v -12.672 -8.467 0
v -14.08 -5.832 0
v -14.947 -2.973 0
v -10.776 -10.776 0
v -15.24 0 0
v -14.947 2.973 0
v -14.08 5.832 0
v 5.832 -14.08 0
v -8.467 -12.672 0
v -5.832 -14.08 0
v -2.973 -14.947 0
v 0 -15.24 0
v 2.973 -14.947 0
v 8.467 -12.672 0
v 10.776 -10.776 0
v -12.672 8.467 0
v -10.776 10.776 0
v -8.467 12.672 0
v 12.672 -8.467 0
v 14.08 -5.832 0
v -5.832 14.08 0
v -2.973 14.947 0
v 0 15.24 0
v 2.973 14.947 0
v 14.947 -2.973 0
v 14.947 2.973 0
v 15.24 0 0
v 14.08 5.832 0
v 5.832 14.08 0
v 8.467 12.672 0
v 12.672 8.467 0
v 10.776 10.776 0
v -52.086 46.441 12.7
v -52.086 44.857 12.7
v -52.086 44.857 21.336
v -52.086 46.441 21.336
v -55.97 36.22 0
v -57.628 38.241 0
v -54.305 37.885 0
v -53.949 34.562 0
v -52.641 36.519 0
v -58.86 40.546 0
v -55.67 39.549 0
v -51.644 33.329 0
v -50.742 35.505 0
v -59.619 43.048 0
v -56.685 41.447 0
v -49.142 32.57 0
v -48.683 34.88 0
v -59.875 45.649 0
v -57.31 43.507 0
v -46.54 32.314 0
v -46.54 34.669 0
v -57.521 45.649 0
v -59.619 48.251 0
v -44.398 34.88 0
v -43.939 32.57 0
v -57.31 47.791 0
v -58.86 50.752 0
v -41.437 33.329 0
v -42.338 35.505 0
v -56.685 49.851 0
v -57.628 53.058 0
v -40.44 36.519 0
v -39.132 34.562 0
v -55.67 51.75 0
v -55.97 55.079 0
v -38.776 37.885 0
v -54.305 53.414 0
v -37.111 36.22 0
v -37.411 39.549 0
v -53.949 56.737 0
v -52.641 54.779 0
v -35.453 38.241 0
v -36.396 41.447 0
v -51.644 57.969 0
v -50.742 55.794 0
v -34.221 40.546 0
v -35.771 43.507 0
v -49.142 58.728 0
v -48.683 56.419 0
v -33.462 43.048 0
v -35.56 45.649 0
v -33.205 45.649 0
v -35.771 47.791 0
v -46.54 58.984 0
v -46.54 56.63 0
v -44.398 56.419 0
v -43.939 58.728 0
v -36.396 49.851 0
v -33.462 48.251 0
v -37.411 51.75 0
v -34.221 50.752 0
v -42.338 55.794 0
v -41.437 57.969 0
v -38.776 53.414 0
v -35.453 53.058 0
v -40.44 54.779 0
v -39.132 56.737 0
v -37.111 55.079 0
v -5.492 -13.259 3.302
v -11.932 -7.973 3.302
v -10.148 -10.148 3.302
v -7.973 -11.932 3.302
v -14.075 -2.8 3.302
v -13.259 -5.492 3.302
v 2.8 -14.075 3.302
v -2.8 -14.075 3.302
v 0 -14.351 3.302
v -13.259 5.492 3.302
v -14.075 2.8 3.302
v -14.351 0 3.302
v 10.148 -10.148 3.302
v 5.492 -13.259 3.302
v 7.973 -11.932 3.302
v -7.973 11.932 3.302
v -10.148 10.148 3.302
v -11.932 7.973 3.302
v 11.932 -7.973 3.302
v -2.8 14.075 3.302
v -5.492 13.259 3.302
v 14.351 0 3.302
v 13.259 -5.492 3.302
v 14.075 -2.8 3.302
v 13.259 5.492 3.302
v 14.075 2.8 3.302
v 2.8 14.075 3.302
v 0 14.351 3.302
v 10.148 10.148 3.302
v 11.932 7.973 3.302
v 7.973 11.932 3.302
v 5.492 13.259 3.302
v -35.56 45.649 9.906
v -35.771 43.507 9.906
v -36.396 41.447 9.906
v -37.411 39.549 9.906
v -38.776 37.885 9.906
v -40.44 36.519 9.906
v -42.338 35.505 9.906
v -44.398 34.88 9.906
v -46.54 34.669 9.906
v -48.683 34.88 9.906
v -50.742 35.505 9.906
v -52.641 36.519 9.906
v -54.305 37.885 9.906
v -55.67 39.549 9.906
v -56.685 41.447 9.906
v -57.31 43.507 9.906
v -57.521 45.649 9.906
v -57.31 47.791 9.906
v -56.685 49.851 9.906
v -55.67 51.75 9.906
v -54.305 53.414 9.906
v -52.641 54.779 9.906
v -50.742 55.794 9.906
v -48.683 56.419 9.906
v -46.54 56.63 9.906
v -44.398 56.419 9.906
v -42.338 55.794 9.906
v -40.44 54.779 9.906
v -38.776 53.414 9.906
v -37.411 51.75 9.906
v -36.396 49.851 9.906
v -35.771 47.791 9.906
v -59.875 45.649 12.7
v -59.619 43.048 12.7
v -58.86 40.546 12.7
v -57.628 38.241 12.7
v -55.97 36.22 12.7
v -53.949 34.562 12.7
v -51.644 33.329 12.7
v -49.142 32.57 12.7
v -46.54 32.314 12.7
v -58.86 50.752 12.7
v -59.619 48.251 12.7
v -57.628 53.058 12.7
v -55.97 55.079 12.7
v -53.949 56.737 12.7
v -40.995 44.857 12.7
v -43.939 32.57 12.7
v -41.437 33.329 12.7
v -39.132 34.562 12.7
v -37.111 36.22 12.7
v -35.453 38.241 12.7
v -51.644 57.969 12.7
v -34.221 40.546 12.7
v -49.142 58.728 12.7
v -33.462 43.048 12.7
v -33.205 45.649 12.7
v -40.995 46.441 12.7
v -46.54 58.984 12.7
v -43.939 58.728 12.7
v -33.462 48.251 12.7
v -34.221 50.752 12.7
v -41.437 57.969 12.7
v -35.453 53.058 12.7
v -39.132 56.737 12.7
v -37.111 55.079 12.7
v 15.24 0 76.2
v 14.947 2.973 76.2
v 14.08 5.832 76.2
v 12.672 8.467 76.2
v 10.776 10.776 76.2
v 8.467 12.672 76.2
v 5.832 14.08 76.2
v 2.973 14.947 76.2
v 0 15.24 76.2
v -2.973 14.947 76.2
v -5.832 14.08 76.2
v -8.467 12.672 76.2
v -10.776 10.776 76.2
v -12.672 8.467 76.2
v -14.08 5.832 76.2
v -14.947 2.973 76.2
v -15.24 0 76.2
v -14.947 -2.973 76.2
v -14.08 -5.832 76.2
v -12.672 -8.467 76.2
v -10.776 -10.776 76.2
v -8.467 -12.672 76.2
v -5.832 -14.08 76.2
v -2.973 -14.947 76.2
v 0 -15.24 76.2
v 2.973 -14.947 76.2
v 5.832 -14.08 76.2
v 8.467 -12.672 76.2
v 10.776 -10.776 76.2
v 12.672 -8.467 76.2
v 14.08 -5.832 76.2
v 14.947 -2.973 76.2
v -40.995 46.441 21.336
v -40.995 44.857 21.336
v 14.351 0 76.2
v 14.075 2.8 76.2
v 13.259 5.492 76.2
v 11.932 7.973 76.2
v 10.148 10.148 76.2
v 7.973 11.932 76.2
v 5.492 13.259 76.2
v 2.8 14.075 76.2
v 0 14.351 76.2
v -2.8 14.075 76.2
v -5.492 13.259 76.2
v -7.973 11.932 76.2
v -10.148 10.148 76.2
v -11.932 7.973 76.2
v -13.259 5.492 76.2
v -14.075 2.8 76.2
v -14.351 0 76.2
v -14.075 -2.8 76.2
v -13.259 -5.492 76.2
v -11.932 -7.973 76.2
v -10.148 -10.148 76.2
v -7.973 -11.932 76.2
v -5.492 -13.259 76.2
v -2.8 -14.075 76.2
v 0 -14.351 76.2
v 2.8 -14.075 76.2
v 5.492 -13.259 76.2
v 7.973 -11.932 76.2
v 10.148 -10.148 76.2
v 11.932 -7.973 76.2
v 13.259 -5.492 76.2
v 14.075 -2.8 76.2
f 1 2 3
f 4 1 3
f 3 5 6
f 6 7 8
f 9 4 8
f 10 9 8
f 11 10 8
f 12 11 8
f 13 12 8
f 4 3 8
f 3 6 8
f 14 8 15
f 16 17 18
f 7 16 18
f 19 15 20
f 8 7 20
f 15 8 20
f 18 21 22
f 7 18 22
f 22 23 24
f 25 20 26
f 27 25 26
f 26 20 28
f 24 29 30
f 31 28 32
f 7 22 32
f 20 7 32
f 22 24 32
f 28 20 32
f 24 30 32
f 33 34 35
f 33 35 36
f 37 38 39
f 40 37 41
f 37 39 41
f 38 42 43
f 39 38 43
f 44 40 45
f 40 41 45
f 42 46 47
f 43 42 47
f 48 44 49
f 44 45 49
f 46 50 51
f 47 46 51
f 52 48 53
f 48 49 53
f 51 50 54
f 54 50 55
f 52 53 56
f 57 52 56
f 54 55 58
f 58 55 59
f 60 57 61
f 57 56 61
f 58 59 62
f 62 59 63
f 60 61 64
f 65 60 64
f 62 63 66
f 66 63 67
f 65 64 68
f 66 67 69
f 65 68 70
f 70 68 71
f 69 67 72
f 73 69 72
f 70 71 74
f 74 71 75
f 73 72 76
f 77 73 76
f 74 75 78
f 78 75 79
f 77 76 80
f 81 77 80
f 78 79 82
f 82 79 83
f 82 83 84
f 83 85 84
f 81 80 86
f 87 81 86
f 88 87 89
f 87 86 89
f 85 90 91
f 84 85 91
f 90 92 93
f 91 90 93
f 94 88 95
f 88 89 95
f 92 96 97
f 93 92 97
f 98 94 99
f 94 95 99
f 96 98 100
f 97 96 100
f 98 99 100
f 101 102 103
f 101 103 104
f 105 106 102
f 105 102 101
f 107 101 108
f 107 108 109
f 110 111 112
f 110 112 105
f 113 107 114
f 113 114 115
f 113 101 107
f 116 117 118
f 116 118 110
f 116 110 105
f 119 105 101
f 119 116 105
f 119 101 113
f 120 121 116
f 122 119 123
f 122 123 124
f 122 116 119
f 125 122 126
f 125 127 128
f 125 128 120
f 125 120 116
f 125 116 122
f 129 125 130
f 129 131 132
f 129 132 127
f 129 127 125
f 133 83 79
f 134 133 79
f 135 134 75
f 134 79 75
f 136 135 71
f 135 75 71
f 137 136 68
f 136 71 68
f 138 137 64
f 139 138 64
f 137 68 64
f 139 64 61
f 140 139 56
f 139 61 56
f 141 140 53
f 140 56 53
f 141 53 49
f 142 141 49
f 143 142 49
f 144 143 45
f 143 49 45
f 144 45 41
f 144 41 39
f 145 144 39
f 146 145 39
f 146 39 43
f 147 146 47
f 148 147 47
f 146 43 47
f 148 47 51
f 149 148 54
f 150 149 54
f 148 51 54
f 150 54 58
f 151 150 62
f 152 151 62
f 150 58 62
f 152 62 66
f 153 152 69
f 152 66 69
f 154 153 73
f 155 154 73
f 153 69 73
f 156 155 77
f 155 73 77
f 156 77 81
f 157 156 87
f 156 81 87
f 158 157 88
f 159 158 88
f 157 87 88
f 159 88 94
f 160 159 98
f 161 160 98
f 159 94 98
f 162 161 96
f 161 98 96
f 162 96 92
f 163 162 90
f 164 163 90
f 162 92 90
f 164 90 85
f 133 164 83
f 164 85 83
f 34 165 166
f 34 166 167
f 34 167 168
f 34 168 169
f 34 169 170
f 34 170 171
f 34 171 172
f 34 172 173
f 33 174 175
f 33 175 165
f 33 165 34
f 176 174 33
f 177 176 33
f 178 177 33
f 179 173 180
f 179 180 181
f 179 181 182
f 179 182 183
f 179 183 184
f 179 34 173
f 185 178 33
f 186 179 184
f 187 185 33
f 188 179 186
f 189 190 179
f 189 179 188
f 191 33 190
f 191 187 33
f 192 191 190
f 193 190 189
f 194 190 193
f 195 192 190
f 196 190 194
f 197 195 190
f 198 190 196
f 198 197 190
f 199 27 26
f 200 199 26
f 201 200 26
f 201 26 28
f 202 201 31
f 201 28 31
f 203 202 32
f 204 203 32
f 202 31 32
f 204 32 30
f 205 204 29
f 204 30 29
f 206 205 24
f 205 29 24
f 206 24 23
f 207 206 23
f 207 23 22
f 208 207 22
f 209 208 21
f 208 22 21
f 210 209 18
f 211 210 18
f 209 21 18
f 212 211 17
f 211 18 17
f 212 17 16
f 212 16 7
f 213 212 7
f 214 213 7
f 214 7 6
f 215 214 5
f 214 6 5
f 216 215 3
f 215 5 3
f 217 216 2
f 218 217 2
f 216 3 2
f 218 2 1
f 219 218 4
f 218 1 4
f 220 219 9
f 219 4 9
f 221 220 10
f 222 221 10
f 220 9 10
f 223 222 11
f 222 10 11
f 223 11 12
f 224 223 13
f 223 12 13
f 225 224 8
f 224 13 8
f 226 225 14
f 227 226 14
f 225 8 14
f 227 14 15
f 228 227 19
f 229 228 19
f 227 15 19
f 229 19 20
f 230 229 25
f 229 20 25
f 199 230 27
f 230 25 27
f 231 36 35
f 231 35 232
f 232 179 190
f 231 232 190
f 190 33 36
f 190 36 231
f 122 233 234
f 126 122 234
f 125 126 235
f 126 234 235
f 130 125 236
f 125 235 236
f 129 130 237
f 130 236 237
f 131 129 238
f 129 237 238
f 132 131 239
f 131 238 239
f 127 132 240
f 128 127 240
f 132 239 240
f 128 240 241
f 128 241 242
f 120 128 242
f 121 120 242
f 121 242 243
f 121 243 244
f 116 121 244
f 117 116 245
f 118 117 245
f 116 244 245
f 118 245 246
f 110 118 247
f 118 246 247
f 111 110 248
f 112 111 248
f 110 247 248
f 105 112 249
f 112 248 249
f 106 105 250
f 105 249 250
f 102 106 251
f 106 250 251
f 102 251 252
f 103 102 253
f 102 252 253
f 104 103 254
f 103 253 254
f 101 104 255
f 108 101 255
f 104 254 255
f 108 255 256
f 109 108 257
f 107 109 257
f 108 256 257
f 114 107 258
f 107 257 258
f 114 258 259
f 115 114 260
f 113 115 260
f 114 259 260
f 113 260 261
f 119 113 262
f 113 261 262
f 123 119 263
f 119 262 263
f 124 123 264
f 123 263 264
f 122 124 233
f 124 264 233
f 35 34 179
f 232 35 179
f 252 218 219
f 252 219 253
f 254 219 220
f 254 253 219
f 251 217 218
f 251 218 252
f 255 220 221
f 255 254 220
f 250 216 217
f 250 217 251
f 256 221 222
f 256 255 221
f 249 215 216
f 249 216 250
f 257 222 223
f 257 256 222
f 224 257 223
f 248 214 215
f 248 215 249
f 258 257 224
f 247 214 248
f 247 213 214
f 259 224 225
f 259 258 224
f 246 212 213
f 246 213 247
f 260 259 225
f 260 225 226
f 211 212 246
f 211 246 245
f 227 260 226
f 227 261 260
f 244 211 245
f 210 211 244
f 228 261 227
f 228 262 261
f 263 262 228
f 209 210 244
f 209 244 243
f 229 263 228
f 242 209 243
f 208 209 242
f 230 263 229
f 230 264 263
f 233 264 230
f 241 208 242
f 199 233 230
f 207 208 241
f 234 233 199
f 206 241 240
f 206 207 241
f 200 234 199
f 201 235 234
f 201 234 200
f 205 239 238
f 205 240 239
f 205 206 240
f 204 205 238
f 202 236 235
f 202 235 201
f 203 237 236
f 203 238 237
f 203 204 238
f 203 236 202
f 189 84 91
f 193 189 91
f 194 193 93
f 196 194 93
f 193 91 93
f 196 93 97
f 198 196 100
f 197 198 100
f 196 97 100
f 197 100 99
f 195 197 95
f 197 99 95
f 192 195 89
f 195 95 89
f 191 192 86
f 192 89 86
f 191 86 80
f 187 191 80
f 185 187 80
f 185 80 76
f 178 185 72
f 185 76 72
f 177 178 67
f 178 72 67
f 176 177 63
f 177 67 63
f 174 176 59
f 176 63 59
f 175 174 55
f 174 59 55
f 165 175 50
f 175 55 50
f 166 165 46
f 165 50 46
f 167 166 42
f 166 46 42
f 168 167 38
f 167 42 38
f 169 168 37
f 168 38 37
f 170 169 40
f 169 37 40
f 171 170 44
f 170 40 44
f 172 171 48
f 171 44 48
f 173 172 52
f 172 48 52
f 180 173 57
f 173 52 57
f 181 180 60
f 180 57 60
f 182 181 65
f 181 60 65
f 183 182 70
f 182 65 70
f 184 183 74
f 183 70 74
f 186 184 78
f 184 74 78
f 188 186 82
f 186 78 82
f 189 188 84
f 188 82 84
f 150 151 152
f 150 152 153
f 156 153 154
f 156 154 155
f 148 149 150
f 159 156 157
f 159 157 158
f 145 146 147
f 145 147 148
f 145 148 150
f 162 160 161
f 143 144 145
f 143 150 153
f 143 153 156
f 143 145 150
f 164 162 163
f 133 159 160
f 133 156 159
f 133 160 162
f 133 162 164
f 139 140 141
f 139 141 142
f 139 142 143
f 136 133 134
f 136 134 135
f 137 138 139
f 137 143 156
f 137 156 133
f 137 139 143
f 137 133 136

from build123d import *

# Parameters (mm, degrees)
F0_R     = 15.24
F1_DEPTH = 76.2
F2_R     = 14.351
F3_DEPTH = 72.898
F4_R     = 13.335
F5_DEPTH = 12.7
F6_R     = 10.980318
F7_DEPTH = 9.906
F8_W     = 11.090502
F8_H     = 1.584351
F9_DEPTH = 8.636


with BuildPart() as f1:
    # F0 (on Top) → F1 (new body)
    with BuildSketch(Plane.XY):
        Circle(F0_R)
    extrude(amount=F1_DEPTH)

    # F2 (on face) → F3 (cut)
    with BuildSketch(Plane.XY.offset(76.2)):
        Circle(F2_R)
    extrude(amount=-F3_DEPTH, mode=Mode.SUBTRACT)


with BuildPart() as f5:
    # F4 (on Top) → F5 (new body)
    with BuildSketch(Plane.XY):
        with Locations((-46.540473, 45.649268)):
            Circle(F4_R)
    extrude(amount=F5_DEPTH)

    # F6 (on face) → F7 (cut)
    with BuildSketch(Plane(origin=(0, 0, 0), x_dir=(1, 0, 0), z_dir=(0, 0, -1))):
        with Locations((-46.540473, -45.649268)):
            Circle(F6_R)
    extrude(amount=-F7_DEPTH, mode=Mode.SUBTRACT)

    # F8 (on face) → F9 (join)
    with BuildSketch(Plane.XY.offset(12.7)):
        with Locations((-46.540473, 45.649268)):
            Rectangle(F8_W, F8_H)
    extrude(amount=F9_DEPTH)


solid = Compound([f1.part, f5.part])
